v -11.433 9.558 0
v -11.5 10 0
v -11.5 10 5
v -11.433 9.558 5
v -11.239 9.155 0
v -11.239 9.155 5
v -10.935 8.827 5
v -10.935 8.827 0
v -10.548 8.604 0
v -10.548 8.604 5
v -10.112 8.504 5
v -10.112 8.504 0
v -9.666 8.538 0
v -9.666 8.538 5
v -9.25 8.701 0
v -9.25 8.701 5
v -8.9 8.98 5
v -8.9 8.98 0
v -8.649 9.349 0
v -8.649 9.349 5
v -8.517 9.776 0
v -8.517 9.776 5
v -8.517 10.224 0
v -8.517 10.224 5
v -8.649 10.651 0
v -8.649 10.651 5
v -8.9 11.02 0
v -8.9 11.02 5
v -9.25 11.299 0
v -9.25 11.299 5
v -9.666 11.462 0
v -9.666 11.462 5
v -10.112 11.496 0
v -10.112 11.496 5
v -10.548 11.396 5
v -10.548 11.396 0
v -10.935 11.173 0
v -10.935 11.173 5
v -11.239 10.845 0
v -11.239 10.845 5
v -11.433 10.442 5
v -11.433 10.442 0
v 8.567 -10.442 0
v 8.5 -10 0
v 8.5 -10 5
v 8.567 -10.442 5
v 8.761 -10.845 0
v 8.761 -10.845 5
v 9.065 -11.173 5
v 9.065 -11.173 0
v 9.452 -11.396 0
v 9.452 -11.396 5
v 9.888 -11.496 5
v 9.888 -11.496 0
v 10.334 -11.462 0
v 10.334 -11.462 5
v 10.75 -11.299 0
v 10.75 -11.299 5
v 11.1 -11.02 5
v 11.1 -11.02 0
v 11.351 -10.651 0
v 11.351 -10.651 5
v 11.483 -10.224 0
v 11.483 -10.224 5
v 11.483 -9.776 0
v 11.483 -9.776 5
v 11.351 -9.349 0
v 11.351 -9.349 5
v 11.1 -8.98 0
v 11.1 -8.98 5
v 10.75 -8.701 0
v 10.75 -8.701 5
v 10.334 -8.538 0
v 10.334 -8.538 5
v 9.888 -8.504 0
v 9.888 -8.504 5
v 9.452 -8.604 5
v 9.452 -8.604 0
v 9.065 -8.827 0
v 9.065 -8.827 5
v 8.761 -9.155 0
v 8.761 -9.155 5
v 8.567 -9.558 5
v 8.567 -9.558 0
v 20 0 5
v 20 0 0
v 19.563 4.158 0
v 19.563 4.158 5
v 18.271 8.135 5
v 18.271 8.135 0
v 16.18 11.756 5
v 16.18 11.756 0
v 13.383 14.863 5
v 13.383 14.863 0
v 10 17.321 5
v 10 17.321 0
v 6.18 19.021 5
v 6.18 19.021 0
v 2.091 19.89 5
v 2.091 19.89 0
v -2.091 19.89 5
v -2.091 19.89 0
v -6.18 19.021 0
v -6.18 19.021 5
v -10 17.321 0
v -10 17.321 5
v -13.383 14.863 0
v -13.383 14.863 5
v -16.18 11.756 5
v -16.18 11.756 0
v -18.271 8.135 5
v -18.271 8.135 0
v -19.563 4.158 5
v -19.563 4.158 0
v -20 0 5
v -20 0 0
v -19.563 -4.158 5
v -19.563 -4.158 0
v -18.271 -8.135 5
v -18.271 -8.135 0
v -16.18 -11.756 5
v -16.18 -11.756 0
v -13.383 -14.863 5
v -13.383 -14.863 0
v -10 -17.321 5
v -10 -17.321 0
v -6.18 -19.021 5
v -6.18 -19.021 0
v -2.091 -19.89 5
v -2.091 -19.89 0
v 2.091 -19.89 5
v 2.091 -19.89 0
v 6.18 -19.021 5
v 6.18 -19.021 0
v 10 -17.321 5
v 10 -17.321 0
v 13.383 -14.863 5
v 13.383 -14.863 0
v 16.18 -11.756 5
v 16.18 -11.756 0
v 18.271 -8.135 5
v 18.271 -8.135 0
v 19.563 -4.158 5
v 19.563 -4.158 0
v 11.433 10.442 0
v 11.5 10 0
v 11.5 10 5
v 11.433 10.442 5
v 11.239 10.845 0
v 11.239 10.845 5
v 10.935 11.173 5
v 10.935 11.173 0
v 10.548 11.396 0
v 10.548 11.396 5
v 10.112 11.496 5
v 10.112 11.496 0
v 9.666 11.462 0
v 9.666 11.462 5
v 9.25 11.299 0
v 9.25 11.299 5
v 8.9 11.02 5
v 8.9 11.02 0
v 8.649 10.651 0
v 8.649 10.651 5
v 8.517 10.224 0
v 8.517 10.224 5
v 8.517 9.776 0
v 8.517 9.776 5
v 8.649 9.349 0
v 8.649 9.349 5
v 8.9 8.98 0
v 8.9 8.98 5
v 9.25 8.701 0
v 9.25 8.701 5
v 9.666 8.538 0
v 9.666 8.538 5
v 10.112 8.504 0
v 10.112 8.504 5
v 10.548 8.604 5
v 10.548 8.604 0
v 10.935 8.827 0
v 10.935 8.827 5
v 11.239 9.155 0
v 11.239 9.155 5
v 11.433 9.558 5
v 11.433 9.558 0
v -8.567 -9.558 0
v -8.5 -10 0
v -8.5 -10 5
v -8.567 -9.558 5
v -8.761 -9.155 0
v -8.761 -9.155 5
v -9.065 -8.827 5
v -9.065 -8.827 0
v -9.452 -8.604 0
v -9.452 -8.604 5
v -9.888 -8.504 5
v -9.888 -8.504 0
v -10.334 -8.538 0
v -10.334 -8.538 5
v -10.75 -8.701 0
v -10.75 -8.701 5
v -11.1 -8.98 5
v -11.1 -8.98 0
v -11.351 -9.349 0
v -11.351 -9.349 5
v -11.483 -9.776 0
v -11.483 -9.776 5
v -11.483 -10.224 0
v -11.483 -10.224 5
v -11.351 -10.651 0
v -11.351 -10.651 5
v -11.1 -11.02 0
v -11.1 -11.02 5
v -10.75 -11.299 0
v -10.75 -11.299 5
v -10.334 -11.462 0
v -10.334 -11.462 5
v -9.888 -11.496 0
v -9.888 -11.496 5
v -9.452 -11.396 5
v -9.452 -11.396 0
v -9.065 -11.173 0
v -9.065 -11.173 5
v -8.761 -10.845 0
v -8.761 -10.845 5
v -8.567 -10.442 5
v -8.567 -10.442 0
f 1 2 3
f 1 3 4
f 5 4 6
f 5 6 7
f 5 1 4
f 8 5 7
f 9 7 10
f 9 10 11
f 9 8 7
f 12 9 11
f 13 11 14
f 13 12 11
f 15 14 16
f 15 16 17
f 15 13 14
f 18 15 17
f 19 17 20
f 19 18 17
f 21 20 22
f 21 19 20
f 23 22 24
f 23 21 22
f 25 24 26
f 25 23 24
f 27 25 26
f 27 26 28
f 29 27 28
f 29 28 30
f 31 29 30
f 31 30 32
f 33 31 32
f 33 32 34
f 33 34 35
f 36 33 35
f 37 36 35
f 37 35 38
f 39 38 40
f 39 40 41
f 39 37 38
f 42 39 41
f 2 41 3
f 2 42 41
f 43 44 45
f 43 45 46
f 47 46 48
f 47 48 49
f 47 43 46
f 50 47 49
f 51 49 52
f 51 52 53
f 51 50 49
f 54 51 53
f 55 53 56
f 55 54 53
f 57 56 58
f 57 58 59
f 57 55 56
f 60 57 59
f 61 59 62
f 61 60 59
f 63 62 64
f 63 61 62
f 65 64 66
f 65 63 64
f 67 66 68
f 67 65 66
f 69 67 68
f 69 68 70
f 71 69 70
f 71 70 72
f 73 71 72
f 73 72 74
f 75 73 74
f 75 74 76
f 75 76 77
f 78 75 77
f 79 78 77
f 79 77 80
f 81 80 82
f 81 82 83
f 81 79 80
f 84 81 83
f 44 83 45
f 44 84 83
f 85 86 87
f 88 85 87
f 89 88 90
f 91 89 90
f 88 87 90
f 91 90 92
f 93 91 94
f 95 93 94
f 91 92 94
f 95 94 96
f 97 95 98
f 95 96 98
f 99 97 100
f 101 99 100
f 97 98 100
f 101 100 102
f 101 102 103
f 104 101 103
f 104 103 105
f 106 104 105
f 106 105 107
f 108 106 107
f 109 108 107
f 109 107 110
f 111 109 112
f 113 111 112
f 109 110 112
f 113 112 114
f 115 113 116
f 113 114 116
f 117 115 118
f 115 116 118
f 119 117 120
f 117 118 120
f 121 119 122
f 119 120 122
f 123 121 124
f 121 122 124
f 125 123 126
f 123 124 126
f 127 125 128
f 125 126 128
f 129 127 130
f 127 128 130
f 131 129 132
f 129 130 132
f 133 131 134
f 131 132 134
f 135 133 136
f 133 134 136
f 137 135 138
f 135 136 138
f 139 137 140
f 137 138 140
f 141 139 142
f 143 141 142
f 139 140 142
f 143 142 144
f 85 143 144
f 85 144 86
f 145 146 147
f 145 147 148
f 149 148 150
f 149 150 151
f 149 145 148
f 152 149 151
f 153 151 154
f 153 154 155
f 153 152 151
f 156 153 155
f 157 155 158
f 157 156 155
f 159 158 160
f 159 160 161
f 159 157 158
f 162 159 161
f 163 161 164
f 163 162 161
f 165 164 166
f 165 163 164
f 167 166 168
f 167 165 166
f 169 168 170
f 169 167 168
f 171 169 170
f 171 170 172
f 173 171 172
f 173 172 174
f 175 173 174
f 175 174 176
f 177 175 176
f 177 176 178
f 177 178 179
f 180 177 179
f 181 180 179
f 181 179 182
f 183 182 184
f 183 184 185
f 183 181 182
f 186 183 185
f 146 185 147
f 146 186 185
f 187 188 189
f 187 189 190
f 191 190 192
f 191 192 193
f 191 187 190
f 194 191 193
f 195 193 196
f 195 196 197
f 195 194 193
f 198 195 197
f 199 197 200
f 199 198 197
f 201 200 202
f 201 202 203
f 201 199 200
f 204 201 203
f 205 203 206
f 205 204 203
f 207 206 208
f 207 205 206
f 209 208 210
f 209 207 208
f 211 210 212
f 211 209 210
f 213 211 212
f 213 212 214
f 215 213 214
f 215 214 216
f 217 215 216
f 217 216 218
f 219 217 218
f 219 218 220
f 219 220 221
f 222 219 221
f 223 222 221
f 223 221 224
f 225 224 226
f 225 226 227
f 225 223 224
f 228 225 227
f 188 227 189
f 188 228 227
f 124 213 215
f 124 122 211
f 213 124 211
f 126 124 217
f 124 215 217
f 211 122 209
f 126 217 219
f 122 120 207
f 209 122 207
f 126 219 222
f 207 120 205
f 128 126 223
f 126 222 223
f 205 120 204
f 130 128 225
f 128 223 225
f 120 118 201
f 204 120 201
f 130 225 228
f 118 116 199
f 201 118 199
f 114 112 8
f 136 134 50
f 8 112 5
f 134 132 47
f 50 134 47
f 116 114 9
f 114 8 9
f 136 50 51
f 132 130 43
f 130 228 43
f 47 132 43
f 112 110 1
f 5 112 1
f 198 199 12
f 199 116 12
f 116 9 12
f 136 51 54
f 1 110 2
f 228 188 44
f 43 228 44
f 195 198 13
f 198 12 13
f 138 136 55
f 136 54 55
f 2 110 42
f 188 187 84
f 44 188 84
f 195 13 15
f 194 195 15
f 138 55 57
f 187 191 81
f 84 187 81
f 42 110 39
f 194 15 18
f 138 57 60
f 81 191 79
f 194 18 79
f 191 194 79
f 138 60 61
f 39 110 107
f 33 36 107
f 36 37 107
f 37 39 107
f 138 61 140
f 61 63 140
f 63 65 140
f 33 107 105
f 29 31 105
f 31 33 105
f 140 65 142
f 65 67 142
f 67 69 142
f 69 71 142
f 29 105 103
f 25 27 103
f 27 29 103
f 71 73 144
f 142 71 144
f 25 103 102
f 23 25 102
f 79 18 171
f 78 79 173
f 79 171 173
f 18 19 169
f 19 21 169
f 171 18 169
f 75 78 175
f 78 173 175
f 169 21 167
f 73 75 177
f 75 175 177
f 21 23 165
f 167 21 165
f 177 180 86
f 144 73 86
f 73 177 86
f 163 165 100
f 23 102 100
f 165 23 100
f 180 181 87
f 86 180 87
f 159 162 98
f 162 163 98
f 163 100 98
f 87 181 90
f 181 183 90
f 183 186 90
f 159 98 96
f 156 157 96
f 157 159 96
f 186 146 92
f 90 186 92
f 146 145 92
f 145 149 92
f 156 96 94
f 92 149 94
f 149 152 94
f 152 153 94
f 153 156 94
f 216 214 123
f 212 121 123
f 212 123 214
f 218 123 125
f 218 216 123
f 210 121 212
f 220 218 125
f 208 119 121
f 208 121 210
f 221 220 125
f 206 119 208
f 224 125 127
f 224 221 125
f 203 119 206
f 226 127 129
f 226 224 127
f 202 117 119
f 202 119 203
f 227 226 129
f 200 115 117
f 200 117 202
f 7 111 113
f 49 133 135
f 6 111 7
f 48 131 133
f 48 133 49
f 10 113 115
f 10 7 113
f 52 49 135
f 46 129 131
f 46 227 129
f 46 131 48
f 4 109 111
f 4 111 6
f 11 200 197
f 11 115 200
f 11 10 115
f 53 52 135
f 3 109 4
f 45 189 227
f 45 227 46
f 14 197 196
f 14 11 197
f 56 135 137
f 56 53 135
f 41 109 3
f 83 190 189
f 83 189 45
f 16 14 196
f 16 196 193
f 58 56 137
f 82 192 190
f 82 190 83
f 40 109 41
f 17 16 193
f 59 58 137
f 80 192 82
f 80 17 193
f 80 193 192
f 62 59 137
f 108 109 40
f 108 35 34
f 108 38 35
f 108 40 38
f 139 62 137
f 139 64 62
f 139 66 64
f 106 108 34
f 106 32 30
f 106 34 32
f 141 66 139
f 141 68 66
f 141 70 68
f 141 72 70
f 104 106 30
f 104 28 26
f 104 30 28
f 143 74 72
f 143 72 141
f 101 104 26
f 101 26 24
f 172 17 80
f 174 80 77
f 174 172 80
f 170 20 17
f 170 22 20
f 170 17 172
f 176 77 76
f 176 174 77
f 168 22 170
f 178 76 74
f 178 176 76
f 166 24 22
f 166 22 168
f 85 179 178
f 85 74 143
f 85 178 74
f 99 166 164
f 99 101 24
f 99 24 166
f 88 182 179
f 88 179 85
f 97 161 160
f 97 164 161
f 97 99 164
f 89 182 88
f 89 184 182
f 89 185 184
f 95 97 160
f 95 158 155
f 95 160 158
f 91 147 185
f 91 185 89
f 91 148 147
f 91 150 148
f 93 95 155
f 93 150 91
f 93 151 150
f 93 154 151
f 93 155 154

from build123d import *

# Parameters (mm, degrees)
SKETCH_1_R      = 20
SKETCH_1_R_2    = 1.5
EXTRUDE_1_DEPTH = 5


with BuildPart() as part:
    # 草圖1 → 填料-伸長1 (new body)
    with BuildSketch(Plane.XY):
        Circle(SKETCH_1_R)
        with Locations((-10, -10)):
            Circle(SKETCH_1_R_2, mode=Mode.SUBTRACT)
        with Locations(Location((-10, 10, 0), (0, 0, 180))):
            Circle(SKETCH_1_R_2, mode=Mode.SUBTRACT)
        with Locations((10, 10)):
            Circle(SKETCH_1_R_2, mode=Mode.SUBTRACT)
        with Locations(Location((10, -10, 0), (0, 0, 180))):
            Circle(SKETCH_1_R_2, mode=Mode.SUBTRACT)
    extrude(amount=EXTRUDE_1_DEPTH)


solid = part.part
